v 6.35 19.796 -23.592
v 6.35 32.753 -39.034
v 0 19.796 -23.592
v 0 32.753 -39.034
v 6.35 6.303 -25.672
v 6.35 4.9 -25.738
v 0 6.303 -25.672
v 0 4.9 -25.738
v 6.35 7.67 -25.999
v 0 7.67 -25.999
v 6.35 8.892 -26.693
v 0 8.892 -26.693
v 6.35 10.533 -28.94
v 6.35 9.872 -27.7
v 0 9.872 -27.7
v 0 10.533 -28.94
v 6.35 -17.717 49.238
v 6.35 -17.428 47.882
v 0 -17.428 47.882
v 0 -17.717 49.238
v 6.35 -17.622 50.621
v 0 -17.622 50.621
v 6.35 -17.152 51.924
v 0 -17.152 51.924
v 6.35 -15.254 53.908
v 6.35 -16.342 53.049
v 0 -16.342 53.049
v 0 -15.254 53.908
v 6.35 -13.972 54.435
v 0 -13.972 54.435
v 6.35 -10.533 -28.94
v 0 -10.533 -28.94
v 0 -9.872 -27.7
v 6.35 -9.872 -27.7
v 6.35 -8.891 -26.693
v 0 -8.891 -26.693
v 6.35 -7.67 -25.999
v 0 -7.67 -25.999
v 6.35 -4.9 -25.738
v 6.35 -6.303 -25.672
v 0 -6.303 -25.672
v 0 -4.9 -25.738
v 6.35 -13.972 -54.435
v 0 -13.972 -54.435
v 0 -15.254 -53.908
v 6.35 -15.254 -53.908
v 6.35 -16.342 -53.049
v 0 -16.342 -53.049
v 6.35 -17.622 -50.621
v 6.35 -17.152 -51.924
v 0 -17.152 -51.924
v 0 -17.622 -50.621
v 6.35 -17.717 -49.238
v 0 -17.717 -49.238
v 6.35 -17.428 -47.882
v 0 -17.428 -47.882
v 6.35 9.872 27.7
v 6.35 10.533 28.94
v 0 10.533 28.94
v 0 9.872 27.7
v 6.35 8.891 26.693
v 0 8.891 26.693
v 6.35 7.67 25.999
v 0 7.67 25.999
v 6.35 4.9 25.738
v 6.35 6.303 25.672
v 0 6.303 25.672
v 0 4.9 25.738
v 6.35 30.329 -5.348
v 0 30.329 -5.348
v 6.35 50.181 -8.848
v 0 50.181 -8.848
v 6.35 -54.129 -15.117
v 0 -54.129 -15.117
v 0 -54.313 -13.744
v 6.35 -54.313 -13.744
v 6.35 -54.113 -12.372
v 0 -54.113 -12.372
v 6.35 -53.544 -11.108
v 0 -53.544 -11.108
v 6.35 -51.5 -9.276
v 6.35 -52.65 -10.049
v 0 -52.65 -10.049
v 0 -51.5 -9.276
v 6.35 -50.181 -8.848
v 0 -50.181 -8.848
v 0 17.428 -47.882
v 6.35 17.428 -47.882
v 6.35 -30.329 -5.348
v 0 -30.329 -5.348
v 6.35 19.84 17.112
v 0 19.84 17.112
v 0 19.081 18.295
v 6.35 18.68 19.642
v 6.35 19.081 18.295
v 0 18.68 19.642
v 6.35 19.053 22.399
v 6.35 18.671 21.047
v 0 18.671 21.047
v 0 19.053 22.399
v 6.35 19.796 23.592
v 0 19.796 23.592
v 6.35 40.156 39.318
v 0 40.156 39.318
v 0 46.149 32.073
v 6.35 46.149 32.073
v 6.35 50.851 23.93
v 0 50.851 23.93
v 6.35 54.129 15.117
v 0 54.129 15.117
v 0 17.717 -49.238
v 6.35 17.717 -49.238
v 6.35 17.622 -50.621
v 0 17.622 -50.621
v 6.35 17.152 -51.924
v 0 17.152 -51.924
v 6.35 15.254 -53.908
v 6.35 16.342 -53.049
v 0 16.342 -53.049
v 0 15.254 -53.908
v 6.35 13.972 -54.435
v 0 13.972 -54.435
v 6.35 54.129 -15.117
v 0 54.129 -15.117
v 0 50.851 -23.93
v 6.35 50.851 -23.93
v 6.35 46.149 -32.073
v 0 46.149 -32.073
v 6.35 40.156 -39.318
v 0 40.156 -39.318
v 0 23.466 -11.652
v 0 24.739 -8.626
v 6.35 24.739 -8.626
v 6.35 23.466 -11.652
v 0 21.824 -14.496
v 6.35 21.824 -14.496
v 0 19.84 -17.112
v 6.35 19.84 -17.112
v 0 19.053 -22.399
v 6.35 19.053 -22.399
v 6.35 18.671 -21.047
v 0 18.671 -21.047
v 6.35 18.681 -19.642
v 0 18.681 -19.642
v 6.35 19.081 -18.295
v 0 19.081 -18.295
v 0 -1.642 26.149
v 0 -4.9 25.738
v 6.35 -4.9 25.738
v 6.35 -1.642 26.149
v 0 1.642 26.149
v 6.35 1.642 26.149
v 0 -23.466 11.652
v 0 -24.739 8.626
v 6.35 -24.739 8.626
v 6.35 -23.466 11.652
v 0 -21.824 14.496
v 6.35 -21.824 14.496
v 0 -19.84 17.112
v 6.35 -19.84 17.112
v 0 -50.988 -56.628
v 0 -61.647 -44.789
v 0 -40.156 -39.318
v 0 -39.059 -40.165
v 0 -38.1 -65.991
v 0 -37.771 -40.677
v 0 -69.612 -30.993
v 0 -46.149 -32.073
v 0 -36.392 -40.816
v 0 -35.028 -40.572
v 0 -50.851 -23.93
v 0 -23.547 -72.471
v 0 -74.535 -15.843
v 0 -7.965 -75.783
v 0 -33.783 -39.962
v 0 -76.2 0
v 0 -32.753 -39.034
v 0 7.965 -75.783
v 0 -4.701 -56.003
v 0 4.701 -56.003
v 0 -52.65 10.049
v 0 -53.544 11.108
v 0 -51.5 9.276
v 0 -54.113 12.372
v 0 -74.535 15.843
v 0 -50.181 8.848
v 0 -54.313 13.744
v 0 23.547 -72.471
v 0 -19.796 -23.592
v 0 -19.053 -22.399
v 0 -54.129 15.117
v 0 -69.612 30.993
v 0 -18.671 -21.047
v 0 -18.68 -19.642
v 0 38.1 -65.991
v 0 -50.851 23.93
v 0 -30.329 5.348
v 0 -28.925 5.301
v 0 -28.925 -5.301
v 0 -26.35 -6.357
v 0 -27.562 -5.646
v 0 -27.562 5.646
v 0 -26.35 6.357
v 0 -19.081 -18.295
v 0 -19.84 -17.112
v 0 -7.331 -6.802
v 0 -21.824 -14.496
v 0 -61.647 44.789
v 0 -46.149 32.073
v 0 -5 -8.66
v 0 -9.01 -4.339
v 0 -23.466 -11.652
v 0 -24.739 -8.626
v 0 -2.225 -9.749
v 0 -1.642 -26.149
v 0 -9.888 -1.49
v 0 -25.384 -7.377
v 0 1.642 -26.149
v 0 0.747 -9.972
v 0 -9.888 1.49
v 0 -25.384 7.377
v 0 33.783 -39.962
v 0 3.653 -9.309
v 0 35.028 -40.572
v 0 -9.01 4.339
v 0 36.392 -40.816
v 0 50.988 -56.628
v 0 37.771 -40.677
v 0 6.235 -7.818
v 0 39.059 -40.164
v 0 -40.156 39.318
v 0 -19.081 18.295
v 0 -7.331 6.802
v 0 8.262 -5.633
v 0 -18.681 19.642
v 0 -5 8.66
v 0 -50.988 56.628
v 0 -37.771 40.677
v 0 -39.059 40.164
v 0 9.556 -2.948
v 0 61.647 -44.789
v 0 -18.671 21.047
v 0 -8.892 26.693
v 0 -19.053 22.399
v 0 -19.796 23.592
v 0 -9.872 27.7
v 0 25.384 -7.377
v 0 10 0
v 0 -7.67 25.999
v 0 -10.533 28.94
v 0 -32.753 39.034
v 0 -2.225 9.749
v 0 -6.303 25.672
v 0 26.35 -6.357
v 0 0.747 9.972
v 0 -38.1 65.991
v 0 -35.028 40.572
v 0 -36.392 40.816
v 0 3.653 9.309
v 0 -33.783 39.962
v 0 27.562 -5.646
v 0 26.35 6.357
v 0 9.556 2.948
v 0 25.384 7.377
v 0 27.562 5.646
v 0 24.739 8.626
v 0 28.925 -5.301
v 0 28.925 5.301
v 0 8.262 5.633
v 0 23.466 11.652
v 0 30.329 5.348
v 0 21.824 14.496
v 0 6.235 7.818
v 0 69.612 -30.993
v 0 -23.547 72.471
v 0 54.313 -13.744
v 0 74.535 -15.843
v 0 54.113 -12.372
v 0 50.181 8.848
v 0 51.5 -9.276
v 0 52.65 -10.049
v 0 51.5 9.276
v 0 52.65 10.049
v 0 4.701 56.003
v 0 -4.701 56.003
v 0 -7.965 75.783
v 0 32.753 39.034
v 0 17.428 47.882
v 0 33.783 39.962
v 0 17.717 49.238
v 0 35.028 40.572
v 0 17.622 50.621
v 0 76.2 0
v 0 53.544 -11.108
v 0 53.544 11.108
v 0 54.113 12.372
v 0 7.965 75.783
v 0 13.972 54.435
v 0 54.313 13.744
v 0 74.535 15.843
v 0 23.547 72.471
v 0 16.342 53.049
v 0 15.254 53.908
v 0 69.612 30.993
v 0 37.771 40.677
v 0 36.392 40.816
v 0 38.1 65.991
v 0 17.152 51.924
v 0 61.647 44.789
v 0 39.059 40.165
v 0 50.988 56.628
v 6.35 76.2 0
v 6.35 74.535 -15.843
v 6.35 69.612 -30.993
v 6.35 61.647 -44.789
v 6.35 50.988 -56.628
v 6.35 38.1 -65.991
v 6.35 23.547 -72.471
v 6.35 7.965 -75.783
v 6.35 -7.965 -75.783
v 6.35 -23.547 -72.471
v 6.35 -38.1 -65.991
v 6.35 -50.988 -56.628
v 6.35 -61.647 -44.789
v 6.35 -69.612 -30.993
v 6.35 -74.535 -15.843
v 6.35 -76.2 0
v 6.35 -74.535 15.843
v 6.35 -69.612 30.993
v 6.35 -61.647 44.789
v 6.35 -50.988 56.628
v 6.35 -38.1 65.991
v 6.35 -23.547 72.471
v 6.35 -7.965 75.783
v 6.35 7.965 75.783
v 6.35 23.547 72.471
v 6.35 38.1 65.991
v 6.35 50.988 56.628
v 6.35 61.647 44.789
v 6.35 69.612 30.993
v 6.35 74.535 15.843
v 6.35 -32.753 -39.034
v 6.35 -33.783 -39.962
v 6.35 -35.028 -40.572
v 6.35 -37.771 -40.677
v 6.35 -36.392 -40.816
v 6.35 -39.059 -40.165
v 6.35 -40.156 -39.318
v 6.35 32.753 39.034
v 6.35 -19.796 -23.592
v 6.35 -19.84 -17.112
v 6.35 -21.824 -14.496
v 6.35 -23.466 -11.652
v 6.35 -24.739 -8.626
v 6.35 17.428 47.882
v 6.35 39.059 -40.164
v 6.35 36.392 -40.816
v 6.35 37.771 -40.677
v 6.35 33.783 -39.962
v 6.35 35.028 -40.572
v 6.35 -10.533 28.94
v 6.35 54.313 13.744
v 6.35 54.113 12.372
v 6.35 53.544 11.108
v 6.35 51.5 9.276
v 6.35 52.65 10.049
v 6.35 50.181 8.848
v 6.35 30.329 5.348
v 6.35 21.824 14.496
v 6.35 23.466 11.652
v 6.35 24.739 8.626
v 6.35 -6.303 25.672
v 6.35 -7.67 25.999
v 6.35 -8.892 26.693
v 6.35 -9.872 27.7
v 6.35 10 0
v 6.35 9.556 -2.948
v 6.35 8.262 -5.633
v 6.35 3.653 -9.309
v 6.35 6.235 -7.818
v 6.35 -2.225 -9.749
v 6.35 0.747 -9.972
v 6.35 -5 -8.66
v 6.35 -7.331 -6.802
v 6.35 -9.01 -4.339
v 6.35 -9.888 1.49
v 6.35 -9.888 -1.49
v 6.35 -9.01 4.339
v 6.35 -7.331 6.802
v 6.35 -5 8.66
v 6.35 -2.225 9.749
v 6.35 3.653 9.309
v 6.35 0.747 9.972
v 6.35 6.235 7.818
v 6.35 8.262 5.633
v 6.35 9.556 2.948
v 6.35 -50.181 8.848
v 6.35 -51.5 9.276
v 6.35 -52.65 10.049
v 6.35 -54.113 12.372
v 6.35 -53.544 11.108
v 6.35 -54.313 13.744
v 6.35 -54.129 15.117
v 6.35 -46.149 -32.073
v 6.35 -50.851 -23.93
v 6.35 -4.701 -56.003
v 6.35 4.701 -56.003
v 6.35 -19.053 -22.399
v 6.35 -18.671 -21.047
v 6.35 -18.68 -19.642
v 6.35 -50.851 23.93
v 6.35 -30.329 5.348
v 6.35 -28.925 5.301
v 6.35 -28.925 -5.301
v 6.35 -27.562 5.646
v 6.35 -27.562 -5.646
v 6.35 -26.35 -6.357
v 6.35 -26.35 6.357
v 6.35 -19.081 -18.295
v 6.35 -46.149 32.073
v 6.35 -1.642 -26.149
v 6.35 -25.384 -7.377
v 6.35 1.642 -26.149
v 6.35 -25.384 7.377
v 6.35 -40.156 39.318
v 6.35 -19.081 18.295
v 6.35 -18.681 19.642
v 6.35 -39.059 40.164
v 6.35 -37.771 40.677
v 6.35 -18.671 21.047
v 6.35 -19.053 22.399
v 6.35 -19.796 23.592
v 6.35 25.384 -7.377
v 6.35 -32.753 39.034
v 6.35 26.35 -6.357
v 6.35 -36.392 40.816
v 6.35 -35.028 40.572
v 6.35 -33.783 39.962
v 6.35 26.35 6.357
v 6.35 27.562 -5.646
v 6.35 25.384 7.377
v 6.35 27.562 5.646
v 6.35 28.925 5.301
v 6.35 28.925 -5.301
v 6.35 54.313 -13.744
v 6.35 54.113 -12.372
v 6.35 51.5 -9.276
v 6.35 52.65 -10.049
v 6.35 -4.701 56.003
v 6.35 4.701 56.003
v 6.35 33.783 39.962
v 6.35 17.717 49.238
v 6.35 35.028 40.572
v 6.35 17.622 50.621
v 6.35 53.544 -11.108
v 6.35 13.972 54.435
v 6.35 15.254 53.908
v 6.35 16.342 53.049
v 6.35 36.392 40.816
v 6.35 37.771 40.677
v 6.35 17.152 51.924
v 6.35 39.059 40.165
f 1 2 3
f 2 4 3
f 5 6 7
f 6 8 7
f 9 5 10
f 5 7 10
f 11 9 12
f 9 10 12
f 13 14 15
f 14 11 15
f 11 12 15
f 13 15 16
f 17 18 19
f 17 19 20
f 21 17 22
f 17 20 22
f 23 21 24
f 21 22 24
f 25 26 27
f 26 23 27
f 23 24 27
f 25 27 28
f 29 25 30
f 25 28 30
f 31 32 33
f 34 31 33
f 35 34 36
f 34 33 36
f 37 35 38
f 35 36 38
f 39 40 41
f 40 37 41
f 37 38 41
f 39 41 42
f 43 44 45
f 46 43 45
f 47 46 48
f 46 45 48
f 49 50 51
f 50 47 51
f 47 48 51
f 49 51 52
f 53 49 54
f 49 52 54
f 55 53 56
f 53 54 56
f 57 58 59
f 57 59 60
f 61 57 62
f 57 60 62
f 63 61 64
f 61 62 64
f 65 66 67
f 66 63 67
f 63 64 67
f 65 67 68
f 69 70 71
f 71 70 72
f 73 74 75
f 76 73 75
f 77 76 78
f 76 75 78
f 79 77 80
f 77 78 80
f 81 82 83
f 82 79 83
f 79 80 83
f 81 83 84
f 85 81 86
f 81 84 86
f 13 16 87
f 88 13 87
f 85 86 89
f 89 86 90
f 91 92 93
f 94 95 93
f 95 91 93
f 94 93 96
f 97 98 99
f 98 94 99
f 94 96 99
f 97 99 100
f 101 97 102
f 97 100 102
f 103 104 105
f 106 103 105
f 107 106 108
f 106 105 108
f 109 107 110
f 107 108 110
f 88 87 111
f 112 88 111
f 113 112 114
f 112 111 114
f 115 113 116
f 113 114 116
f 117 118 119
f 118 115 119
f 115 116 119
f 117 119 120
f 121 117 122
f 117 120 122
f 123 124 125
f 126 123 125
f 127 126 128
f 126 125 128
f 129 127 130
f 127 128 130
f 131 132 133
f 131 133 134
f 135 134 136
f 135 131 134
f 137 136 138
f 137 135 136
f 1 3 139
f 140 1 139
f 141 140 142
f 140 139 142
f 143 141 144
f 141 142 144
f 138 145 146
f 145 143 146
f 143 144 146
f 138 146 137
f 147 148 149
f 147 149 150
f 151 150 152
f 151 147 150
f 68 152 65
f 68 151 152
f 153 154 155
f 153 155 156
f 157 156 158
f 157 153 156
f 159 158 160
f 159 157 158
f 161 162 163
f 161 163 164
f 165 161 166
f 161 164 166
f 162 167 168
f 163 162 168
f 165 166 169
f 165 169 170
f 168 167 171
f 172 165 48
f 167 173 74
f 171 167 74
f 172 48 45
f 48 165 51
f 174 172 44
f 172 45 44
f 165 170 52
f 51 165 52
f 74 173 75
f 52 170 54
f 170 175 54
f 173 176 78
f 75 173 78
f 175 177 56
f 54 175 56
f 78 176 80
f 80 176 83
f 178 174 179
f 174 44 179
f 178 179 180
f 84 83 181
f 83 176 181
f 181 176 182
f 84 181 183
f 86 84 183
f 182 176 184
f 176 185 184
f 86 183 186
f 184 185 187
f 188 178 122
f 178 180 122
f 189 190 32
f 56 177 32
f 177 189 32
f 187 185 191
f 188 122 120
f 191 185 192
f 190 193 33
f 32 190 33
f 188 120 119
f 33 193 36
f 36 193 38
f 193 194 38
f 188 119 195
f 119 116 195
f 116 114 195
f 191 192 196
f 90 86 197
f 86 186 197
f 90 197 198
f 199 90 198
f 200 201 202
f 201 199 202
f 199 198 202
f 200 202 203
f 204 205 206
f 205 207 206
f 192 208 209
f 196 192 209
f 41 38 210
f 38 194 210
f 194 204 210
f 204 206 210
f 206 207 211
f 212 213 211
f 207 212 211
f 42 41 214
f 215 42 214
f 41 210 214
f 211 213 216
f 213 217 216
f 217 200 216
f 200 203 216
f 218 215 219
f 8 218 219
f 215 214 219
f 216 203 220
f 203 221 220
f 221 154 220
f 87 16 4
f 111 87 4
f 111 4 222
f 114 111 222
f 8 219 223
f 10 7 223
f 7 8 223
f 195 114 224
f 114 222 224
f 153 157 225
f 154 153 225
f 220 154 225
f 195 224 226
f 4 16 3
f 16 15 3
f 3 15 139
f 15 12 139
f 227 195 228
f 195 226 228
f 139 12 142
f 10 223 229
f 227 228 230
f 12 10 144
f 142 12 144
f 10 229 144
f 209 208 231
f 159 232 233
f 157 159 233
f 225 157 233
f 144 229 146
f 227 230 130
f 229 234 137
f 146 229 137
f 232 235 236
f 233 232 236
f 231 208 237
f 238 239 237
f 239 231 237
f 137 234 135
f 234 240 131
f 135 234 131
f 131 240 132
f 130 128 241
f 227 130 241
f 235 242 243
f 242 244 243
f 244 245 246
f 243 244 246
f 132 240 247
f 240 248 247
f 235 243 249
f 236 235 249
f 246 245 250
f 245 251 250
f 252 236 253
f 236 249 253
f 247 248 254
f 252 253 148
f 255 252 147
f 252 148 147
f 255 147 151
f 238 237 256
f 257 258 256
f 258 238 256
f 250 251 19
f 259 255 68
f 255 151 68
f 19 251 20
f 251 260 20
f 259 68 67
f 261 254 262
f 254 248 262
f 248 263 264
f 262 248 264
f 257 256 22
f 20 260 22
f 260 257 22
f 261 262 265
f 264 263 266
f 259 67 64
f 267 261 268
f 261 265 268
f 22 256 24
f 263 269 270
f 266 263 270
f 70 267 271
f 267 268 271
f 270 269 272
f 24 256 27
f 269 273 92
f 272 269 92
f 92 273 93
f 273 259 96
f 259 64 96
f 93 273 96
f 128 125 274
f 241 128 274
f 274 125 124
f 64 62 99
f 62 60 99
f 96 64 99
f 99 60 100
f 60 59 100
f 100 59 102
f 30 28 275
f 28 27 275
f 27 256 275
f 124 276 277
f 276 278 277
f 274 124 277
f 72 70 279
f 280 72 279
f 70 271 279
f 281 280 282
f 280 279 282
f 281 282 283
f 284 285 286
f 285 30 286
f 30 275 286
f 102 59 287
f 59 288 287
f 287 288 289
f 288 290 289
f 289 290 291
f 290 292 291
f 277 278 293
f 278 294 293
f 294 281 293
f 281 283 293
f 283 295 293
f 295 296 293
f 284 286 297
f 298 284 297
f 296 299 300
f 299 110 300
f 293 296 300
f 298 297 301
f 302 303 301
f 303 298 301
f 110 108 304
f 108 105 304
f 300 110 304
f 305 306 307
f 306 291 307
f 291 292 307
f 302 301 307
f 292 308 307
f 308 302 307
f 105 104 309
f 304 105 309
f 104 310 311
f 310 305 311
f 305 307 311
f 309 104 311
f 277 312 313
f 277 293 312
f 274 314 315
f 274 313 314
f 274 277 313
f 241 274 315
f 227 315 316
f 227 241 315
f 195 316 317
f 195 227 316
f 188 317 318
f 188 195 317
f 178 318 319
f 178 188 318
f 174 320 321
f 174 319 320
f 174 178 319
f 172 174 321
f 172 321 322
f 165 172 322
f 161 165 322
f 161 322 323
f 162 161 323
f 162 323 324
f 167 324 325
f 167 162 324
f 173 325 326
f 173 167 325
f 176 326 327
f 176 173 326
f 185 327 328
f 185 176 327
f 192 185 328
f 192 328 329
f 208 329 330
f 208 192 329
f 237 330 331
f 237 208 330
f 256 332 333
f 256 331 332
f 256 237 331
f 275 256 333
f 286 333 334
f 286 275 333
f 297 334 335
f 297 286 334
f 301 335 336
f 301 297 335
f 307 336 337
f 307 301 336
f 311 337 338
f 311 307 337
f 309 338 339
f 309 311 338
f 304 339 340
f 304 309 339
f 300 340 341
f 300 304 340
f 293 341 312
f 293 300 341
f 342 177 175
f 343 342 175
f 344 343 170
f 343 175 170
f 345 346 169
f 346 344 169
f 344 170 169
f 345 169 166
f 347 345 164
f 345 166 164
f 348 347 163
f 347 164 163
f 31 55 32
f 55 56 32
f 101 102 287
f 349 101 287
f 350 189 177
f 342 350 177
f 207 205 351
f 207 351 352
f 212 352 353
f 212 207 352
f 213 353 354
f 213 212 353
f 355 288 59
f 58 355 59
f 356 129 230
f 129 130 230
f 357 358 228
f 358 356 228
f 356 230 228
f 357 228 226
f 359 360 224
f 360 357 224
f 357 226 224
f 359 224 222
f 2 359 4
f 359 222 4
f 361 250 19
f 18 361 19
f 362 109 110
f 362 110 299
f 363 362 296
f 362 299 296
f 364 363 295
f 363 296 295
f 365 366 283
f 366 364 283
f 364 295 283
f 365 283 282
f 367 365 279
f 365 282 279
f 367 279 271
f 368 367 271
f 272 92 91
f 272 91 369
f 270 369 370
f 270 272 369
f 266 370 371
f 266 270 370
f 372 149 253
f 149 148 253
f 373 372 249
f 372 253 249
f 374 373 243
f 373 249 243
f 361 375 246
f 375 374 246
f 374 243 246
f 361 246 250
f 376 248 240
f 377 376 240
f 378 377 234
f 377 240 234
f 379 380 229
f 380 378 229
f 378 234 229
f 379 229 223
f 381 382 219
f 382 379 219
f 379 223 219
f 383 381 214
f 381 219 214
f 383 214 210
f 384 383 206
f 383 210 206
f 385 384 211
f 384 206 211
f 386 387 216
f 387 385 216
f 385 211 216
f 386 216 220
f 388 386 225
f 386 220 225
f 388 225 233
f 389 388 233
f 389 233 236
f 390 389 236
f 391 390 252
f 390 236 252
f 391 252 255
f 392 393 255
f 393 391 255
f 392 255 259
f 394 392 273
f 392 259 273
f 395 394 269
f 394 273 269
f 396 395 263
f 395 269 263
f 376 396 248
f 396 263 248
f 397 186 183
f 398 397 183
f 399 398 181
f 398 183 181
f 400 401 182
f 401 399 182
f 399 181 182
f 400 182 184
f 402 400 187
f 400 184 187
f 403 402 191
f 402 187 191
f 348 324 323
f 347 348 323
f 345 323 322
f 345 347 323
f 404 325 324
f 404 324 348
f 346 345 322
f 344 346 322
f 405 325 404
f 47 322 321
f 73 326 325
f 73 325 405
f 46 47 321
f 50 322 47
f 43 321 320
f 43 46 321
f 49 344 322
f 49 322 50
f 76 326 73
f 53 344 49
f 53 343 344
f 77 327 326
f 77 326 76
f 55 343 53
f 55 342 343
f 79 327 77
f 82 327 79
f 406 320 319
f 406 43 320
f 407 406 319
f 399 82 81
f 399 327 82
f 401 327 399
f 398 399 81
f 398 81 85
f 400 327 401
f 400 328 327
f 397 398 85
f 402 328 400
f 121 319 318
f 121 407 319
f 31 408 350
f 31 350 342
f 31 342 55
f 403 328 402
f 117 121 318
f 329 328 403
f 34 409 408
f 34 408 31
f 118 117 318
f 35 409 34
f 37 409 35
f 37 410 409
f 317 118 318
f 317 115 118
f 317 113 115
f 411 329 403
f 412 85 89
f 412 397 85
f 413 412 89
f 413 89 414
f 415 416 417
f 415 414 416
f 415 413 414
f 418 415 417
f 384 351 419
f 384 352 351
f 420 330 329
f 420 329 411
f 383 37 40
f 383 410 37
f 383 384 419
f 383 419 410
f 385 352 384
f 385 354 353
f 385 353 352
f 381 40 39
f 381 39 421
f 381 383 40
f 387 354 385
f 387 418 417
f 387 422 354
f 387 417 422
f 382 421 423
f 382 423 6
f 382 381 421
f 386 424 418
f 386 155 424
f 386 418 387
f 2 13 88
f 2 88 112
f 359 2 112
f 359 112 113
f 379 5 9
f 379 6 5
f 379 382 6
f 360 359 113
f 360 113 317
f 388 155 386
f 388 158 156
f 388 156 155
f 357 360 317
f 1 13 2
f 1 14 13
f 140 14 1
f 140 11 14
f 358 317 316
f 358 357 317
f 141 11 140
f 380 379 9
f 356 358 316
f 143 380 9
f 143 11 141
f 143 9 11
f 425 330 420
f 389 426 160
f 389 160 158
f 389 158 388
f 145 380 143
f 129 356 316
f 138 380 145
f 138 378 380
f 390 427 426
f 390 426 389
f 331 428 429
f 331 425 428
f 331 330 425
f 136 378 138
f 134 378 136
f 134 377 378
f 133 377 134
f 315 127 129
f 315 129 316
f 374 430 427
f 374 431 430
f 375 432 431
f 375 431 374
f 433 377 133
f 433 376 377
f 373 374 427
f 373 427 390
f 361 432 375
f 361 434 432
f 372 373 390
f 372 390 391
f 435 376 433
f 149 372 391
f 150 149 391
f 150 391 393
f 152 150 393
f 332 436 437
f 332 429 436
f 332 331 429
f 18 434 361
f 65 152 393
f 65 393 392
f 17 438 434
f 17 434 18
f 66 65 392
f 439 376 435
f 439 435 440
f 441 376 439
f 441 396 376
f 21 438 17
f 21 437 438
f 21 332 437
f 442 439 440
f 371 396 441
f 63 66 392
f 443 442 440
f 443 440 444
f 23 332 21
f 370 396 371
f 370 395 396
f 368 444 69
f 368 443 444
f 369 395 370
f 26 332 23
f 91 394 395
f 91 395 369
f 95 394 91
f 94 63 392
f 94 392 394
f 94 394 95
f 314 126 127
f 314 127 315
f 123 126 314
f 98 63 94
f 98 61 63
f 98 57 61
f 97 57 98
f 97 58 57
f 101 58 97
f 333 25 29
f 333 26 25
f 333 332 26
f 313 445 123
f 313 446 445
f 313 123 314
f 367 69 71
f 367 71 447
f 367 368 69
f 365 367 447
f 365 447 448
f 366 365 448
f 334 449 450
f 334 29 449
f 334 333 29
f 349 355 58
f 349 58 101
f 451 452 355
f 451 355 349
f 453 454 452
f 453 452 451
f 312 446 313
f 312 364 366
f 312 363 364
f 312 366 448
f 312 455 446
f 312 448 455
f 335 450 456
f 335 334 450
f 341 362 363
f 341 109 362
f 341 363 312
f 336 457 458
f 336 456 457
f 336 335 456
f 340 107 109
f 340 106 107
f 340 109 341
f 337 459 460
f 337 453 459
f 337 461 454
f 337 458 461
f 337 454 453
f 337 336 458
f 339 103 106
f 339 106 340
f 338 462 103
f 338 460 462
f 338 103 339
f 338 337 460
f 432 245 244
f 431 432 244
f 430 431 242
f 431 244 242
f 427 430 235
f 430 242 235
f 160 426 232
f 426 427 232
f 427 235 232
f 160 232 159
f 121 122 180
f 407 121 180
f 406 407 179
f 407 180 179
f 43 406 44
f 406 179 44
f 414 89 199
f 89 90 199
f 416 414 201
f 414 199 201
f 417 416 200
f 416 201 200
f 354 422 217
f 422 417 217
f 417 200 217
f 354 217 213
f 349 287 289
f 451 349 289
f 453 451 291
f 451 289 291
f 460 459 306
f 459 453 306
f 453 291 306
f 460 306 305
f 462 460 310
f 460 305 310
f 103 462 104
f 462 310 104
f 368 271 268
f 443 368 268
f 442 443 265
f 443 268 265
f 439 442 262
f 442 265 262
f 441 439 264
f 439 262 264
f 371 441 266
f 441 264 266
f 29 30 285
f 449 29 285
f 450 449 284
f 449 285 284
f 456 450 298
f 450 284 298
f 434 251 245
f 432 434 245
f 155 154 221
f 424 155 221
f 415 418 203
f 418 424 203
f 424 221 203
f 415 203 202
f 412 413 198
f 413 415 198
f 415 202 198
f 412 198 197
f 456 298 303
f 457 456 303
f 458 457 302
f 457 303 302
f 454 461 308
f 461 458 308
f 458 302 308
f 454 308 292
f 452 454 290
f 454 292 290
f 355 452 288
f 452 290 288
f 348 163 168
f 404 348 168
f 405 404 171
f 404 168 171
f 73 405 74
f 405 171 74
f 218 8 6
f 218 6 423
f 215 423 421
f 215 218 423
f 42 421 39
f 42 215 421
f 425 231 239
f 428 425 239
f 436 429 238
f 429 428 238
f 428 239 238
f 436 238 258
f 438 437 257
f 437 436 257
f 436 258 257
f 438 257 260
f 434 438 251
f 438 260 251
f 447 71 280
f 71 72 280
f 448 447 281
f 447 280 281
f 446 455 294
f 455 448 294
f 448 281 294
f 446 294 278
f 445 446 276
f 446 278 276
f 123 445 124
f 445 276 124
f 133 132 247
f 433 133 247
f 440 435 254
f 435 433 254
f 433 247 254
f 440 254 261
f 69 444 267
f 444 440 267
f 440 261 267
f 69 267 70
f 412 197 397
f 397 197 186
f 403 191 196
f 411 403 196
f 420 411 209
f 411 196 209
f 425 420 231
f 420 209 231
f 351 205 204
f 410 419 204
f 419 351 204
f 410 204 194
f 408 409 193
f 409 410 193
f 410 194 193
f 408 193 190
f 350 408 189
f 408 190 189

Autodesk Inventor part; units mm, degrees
ref_plane "YZ Plane" through (0, 0, 0) normal (1, 0, 0) x (0, 1, 0)
ref_plane "XZ Plane" through (0, 0, 0) normal (0, 1, 0) x (-1, 0, 0)
ref_plane "XY Plane" through (0, 0, 0) normal (0, 0, 1) x (1, 0, 0)
sketch "Sketch1" plane through (0, 0, 0) normal (1, 0, 0) x (0, 1, 0)
  circle A0 centre (0, 0) radius 76.2
  line L0 (0, 0) -> (44.7892, 61.6471) construction
  line L1 (0, 0) -> (-44.7892, 61.6471) construction
  line L2 (0, 0) -> (-26.0619, 71.6046) construction
  line L3 (0, -76.2) -> (0, 76.2) construction
  line L4 (-10.5331, 28.9395) -> (-17.4277, 47.8823)
  arc A1 (13.9724, 54.4354) -> (-13.9724, 54.4354) centre (0, 0) ccw
  arc A2 (4.8996, 25.7378) -> (-4.8996, 25.7378) centre (0, 0) ccw
  arc A3 (17.4277, 47.8823) -> (13.9724, 54.4354) centre (12.7293, 49.5924) ccw
  arc A4 (4.8996, 25.7378) -> (10.5331, 28.9395) centre (5.8346, 30.6496) ccw
  arc A5 (-10.5331, 28.9395) -> (-4.8996, 25.7378) centre (-5.8346, 30.6496) ccw
  arc A6 (-13.9724, 54.4354) -> (-17.4277, 47.8823) centre (-12.7293, 49.5924) ccw
  line L5 (0, 0) -> (26.0619, 71.6046) construction
  line L6 (17.4277, 47.8823) -> (10.5331, 28.9395)
  line L7 (-32.7534, 39.034) -> (-19.7958, 23.5917)
  arc A7 (-32.7534, 39.034) -> (-40.1563, 39.3181) centre (-36.5836, 35.8201) ccw
  arc A8 (-19.8398, 17.1121) -> (-19.7958, 23.5917) centre (-23.626, 20.3777) ccw
  line L8 (-30.3289, 5.3478) -> (-50.1811, 8.8483)
  arc A9 (-30.3289, 5.3478) -> (-24.7394, 8.6257) centre (-29.4606, 10.2718) ccw
  arc A10 (-19.8398, 17.1121) -> (-24.7394, 8.6257) centre (0, 0) ccw
  arc A11 (-40.1563, 39.3181) -> (-54.1286, 15.1173) centre (0, 0) ccw
  arc A12 (-54.1286, 15.1173) -> (-50.1811, 8.8483) centre (-49.3129, 13.7723) ccw
  line L9 (-50.1811, -8.8483) -> (-30.3289, -5.3478)
  arc A13 (-50.1811, -8.8483) -> (-54.1286, -15.1173) centre (-49.3129, -13.7723) ccw
  arc A14 (-24.7394, -8.6257) -> (-30.3289, -5.3478) centre (-29.4606, -10.2718) ccw
  line L10 (-19.7958, -23.5917) -> (-32.7534, -39.034)
  arc A15 (-19.7958, -23.5917) -> (-19.8398, -17.1121) centre (-23.626, -20.3777) ccw
  arc A16 (-24.7394, -8.6257) -> (-19.8398, -17.1121) centre (0, 0) ccw
  arc A17 (-54.1286, -15.1173) -> (-40.1563, -39.3181) centre (0, 0) ccw
  arc A18 (-40.1563, -39.3181) -> (-32.7534, -39.034) centre (-36.5836, -35.8201) ccw
  line L11 (-17.4277, -47.8823) -> (-10.5331, -28.9395)
  arc A19 (-17.4277, -47.8823) -> (-13.9724, -54.4354) centre (-12.7293, -49.5924) ccw
  arc A20 (-4.8996, -25.7378) -> (-10.5331, -28.9395) centre (-5.8346, -30.6496) ccw
  line L12 (10.5331, -28.9395) -> (17.4277, -47.8823)
  arc A21 (10.5331, -28.9395) -> (4.8996, -25.7378) centre (5.8346, -30.6496) ccw
  arc A22 (-4.8996, -25.7378) -> (4.8996, -25.7378) centre (0, 0) ccw
  arc A23 (-13.9724, -54.4354) -> (13.9724, -54.4354) centre (0, 0) ccw
  arc A24 (13.9724, -54.4354) -> (17.4277, -47.8823) centre (12.7293, -49.5924) ccw
  line L13 (32.7534, -39.034) -> (19.7958, -23.5917)
  arc A25 (32.7534, -39.034) -> (40.1563, -39.3181) centre (36.5836, -35.8201) ccw
  arc A26 (19.8398, -17.1121) -> (19.7958, -23.5917) centre (23.626, -20.3777) ccw
  line L14 (30.3289, -5.3478) -> (50.1811, -8.8483)
  arc A27 (30.3289, -5.3478) -> (24.7394, -8.6257) centre (29.4606, -10.2718) ccw
  arc A28 (19.8398, -17.1121) -> (24.7394, -8.6257) centre (0, 0) ccw
  arc A29 (40.1563, -39.3181) -> (54.1286, -15.1173) centre (0, 0) ccw
  arc A30 (54.1286, -15.1173) -> (50.1811, -8.8483) centre (49.3129, -13.7723) ccw
  circle A31 centre (0, 0) radius 10
  circle A32 centre (0, 0) radius 26.2 construction
  line L15 (50.1811, 8.8483) -> (30.3289, 5.3478)
  arc A33 (50.1811, 8.8483) -> (54.1286, 15.1173) centre (49.3129, 13.7723) ccw
  arc A34 (24.7394, 8.6257) -> (30.3289, 5.3478) centre (29.4606, 10.2718) ccw
  line L16 (19.7958, 23.5917) -> (32.7534, 39.034)
  arc A35 (19.7958, 23.5917) -> (19.8398, 17.1121) centre (23.626, 20.3777) ccw
  arc A36 (24.7394, 8.6257) -> (19.8398, 17.1121) centre (0, 0) ccw
  arc A37 (54.1286, 15.1173) -> (40.1563, 39.3181) centre (0, 0) ccw
  arc A38 (40.1563, 39.3181) -> (32.7534, 39.034) centre (36.5836, 35.8201) ccw
  point P0 (8.9609, 24.6199)
  point P1 (-8.9609, 24.6199)
  point P2 (-19.2215, 52.8107)
  dimension "d1" = 72
  dimension "d4" = 16
  dimension "d7" = 20
  dimension "d8" = 152.4
  dimension "d9" = 30
  dimension "d10" = 5
  dimension "d11" = 5
  dimension "d12" = 36
  dimension "d13" = 20
  dimension "d16" = 360
  dimension "d18" = 20
  dimension "d21" = 52.4
extrude "Extrusion2" add sketch "Sketch1" along normal blind 6.35
properties part number "paddlewheel_outer"
